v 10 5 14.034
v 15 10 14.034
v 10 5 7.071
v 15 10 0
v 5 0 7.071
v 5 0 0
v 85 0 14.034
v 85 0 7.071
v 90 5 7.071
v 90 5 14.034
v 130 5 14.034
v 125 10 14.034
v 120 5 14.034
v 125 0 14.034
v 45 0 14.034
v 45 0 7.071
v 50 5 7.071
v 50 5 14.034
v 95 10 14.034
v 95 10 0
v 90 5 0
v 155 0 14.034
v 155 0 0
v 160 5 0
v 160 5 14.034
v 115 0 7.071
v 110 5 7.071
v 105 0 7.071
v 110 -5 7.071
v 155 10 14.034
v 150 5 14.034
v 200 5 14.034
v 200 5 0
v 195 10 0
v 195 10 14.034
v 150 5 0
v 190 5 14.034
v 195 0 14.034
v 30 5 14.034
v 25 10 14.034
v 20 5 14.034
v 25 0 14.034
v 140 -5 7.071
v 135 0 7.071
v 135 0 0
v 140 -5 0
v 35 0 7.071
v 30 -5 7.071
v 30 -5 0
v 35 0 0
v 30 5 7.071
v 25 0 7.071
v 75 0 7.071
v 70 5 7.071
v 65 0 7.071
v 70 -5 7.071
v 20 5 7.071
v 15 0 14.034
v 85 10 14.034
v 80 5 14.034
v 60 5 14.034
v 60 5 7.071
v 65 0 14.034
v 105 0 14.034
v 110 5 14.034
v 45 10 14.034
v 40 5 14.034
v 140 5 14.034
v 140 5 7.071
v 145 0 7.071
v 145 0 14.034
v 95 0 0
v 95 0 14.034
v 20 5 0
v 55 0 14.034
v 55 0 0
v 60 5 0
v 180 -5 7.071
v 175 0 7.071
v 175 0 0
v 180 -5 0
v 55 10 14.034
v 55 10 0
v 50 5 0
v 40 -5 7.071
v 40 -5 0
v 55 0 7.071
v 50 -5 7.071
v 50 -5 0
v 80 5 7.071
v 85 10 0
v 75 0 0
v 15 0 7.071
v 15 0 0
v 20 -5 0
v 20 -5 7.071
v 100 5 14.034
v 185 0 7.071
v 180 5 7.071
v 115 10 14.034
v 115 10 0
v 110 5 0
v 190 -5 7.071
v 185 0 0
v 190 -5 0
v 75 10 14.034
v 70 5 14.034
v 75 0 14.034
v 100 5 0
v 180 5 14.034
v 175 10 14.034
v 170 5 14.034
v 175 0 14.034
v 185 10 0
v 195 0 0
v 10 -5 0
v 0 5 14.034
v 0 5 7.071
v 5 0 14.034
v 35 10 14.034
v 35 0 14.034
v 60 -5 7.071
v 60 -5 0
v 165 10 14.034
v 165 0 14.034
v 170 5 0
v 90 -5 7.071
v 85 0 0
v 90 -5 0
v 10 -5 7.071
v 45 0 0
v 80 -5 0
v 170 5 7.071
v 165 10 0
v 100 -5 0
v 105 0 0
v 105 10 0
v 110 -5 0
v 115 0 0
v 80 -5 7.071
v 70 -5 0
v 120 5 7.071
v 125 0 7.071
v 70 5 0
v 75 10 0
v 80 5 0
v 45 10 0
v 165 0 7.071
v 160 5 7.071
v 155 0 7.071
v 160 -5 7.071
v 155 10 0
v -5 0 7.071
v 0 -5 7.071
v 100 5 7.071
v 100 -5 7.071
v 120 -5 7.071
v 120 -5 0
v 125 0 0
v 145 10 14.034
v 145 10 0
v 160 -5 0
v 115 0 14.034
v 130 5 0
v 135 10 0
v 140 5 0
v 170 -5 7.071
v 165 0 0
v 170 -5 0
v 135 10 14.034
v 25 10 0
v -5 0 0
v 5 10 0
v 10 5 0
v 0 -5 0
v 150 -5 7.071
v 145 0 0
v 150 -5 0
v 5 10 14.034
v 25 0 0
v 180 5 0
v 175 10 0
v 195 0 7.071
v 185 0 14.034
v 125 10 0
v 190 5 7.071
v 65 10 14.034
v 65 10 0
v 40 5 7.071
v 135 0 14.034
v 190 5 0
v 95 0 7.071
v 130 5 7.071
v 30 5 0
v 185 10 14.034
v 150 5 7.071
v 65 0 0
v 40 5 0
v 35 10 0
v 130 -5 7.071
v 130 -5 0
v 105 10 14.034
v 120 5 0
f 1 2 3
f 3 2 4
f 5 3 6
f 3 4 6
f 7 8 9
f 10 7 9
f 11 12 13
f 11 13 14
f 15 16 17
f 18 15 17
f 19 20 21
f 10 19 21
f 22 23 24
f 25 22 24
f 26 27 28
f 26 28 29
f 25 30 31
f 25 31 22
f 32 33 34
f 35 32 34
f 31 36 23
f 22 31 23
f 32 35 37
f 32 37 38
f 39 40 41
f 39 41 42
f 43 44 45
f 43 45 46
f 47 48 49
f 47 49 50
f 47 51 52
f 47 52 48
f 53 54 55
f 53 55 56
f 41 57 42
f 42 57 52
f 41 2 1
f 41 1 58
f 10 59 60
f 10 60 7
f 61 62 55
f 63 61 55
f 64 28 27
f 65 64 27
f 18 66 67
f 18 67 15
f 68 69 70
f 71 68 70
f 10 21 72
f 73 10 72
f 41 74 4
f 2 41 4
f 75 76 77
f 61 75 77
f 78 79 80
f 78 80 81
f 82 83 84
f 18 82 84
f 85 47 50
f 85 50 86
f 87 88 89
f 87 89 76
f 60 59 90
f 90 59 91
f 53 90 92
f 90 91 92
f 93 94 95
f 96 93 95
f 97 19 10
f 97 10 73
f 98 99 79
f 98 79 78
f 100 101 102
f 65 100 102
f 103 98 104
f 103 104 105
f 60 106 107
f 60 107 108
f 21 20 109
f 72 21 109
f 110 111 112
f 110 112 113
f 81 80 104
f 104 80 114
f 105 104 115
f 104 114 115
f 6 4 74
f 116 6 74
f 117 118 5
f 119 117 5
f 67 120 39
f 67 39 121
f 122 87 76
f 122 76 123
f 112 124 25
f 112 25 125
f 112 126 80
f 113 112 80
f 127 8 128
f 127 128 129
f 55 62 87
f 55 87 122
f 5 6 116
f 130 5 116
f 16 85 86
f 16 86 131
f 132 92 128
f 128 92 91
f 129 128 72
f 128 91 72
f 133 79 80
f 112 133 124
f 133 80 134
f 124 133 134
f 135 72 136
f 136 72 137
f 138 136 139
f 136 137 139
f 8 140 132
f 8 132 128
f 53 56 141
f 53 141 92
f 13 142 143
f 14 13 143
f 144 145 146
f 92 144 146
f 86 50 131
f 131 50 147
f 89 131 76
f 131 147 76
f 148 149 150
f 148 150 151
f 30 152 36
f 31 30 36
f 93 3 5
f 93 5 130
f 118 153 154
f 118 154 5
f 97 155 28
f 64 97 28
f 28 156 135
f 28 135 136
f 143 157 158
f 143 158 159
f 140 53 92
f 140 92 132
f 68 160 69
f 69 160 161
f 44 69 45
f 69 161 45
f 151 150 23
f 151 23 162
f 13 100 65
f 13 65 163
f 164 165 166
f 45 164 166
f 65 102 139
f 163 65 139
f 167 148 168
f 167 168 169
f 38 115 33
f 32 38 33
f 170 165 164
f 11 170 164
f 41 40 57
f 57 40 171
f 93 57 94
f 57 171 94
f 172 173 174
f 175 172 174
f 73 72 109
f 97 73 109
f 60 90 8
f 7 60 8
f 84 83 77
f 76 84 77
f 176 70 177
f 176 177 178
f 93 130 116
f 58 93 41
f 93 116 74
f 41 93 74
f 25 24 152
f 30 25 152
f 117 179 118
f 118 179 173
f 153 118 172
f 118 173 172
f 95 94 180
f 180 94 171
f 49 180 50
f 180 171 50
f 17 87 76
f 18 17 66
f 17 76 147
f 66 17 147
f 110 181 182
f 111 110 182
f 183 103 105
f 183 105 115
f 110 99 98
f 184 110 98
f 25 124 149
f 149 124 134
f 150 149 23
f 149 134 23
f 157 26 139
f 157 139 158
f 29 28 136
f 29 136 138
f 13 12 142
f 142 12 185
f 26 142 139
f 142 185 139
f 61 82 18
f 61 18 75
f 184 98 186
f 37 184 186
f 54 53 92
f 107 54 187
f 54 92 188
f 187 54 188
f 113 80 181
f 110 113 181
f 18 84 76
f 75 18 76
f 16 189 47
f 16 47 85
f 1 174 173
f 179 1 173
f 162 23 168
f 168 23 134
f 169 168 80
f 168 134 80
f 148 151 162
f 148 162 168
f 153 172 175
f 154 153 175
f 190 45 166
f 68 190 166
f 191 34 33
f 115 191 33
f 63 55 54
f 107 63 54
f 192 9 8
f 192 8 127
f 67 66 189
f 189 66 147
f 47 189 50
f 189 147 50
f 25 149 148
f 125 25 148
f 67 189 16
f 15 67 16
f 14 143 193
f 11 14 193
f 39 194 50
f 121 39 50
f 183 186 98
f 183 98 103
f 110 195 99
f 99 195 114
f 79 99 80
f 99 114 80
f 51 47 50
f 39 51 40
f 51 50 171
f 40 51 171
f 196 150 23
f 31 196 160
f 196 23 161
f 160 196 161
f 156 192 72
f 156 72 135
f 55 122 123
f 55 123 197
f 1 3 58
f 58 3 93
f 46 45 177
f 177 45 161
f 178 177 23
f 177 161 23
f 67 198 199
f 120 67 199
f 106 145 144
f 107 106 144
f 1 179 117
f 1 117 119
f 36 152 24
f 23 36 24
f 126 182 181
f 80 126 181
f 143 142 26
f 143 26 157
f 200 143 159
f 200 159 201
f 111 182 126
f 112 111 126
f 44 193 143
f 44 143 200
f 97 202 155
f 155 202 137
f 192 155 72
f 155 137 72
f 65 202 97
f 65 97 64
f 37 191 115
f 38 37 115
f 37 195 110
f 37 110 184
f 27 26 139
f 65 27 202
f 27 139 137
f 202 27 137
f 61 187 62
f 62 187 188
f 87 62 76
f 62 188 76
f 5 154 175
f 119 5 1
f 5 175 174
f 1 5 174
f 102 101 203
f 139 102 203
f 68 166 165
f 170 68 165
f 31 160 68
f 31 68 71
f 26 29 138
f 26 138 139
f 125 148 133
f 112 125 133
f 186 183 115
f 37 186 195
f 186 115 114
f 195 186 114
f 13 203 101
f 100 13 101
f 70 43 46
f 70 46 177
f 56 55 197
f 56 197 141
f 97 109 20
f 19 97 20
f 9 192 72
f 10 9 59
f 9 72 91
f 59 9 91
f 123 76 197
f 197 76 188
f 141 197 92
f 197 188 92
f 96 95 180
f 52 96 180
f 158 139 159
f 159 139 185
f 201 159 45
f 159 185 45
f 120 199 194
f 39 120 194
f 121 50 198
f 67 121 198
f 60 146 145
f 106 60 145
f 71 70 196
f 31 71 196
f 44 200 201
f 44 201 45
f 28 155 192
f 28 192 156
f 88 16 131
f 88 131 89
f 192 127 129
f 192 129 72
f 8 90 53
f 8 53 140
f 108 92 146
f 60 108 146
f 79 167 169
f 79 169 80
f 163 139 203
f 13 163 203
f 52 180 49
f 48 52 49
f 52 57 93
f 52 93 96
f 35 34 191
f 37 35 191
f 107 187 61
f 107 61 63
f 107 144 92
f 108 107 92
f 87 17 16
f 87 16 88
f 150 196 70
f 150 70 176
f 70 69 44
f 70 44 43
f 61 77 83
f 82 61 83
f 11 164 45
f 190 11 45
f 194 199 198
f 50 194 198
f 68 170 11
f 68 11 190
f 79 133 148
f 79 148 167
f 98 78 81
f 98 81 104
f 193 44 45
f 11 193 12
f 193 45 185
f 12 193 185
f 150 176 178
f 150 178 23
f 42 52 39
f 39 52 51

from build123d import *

# Parameters (mm, degrees)
F1_DEPTH = 7.07107
F2_DEPTH = 14.034


with BuildPart() as f1:
    # F0 (on Top) → F1 (new body)
    with BuildSketch(Plane.XY):
        Polygon((5, 0), (0, 5), (-5, 0), (0, -5), align=None)
    extrude(amount=F1_DEPTH)

    # F0 (on Top) → F2, piece 4 (join)
    with BuildSketch(Plane.XY):
        Polygon((5, 10), (0, 5), (5, 0), (10, 5), align=None)
    extrude(amount=F2_DEPTH)


with BuildPart() as f1b:
    # F0 (on Top) → F1, piece 2 (new body)
    with BuildSketch(Plane.XY):
        Polygon((10, 5), (5, 0), (10, -5), (15, 0), align=None)
    extrude(amount=F1_DEPTH)

    # F0 (on Top) → F2 (join)
    with BuildSketch(Plane.XY):
        Polygon((15, 10), (10, 5), (15, 0), (20, 5), align=None)
    extrude(amount=F2_DEPTH)


with BuildPart() as f1c:
    # F0 (on Top) → F1, piece 3 (new body)
    with BuildSketch(Plane.XY):
        Polygon((20, 5), (15, 0), (20, -5), (25, 0), align=None)
    extrude(amount=F1_DEPTH)



with BuildPart() as f1d:
    # F0 (on Top) → F1, piece 4 (new body)
    with BuildSketch(Plane.XY):
        Polygon((30, 5), (25, 0), (30, -5), (35, 0), align=None)
    extrude(amount=F1_DEPTH)


with BuildPart() as f1e:
    # F0 (on Top) → F1, piece 5 (new body)
    with BuildSketch(Plane.XY):
        Polygon((40, 5), (35, 0), (40, -5), (45, 0), align=None)
    extrude(amount=F1_DEPTH)



with BuildPart() as f1f:
    # F0 (on Top) → F1, piece 6 (new body)
    with BuildSketch(Plane.XY):
        Polygon((50, 5), (45, 0), (50, -5), (55, 0), align=None)
    extrude(amount=F1_DEPTH)


with BuildPart() as f1g:
    # F0 (on Top) → F1, piece 7 (new body)
    with BuildSketch(Plane.XY):
        Polygon((60, 5), (55, 0), (60, -5), (65, 0), align=None)
    extrude(amount=F1_DEPTH)



with BuildPart() as f1h:
    # F0 (on Top) → F1, piece 8 (new body)
    with BuildSketch(Plane.XY):
        Polygon((70, 5), (65, 0), (70, -5), (75, 0), align=None)
    extrude(amount=F1_DEPTH)


with BuildPart() as f1i:
    # F0 (on Top) → F1, piece 9 (new body)
    with BuildSketch(Plane.XY):
        Polygon((80, 5), (75, 0), (80, -5), (85, 0), align=None)
    extrude(amount=F1_DEPTH)



with BuildPart() as f1j:
    # F0 (on Top) → F1, piece 10 (new body)
    with BuildSketch(Plane.XY):
        Polygon((90, 5), (85, 0), (90, -5), (95, 0), align=None)
    extrude(amount=F1_DEPTH)


with BuildPart() as f1k:
    # F0 (on Top) → F1, piece 11 (new body)
    with BuildSketch(Plane.XY):
        Polygon((100, 5), (95, 0), (100, -5), (105, 0), align=None)
    extrude(amount=F1_DEPTH)



with BuildPart() as f1l:
    # F0 (on Top) → F1, piece 12 (new body)
    with BuildSketch(Plane.XY):
        Polygon((110, 5), (105, 0), (110, -5), (115, 0), align=None)
    extrude(amount=F1_DEPTH)


with BuildPart() as f1m:
    # F0 (on Top) → F1, piece 13 (new body)
    with BuildSketch(Plane.XY):
        Polygon((120, 5), (115, 0), (120, -5), (125, 0), align=None)
    extrude(amount=F1_DEPTH)



with BuildPart() as f1n:
    # F0 (on Top) → F1, piece 14 (new body)
    with BuildSketch(Plane.XY):
        Polygon((130, 5), (125, 0), (130, -5), (135, 0), align=None)
    extrude(amount=F1_DEPTH)


with BuildPart() as f1o:
    # F0 (on Top) → F1, piece 15 (new body)
    with BuildSketch(Plane.XY):
        Polygon((140, 5), (135, 0), (140, -5), (145, 0), align=None)
    extrude(amount=F1_DEPTH)



with BuildPart() as f1p:
    # F0 (on Top) → F1, piece 16 (new body)
    with BuildSketch(Plane.XY):
        Polygon((150, 5), (145, 0), (150, -5), (155, 0), align=None)
    extrude(amount=F1_DEPTH)


with BuildPart() as f1q:
    # F0 (on Top) → F1, piece 17 (new body)
    with BuildSketch(Plane.XY):
        Polygon((160, 5), (155, 0), (160, -5), (165, 0), align=None)
    extrude(amount=F1_DEPTH)



with BuildPart() as f1r:
    # F0 (on Top) → F1, piece 18 (new body)
    with BuildSketch(Plane.XY):
        Polygon((170, 5), (165, 0), (170, -5), (175, 0), align=None)
    extrude(amount=F1_DEPTH)


with BuildPart() as f1s:
    # F0 (on Top) → F1, piece 19 (new body)
    with BuildSketch(Plane.XY):
        Polygon((180, 5), (175, 0), (180, -5), (185, 0), align=None)
    extrude(amount=F1_DEPTH)



with BuildPart() as f1t:
    # F0 (on Top) → F1, piece 20 (new body)
    with BuildSketch(Plane.XY):
        Polygon((190, 5), (185, 0), (190, -5), (195, 0), align=None)
    extrude(amount=F1_DEPTH)


with BuildPart() as f1c_1:
    add(f1c.part)

    add(f1d.part)  # F2#2 merges F1d
    # F0 (on Top) → F2, piece 2 (join)
    with BuildSketch(Plane.XY):
        Polygon((25, 10), (20, 5), (25, 0), (30, 5), align=None)
    extrude(amount=F2_DEPTH)


with BuildPart() as f2:
    # F0 (on Top) → F2, piece 3 (new body)
    with BuildSketch(Plane.XY):
        Polygon((35, 10), (30, 5), (35, 0), (40, 5), align=None)
    extrude(amount=F2_DEPTH)


with BuildPart() as f1e_1:
    add(f1e.part)

    add(f1f.part)  # F2#5 merges F1f
    # F0 (on Top) → F2, piece 5 (join)
    with BuildSketch(Plane.XY):
        Polygon((45, 10), (40, 5), (45, 0), (50, 5), align=None)
    extrude(amount=F2_DEPTH)


with BuildPart() as f2b:
    # F0 (on Top) → F2, piece 6 (new body)
    with BuildSketch(Plane.XY):
        Polygon((95, 10), (90, 5), (95, 0), (100, 5), align=None)
    extrude(amount=F2_DEPTH)


with BuildPart() as f1k_1:
    add(f1k.part)

    add(f1l.part)  # F2#7 merges F1l
    # F0 (on Top) → F2, piece 7 (join)
    with BuildSketch(Plane.XY):
        Polygon((105, 10), (100, 5), (105, 0), (110, 5), align=None)
    extrude(amount=F2_DEPTH)


with BuildPart() as f2c:
    # F0 (on Top) → F2, piece 8 (new body)
    with BuildSketch(Plane.XY):
        Polygon((115, 10), (110, 5), (115, 0), (120, 5), align=None)
    extrude(amount=F2_DEPTH)


with BuildPart() as f1m_1:
    add(f1m.part)

    add(f1n.part)  # F2#9 merges F1n
    # F0 (on Top) → F2, piece 9 (join)
    with BuildSketch(Plane.XY):
        Polygon((125, 10), (120, 5), (125, 0), (130, 5), align=None)
    extrude(amount=F2_DEPTH)


with BuildPart() as f2d:
    # F0 (on Top) → F2, piece 10 (new body)
    with BuildSketch(Plane.XY):
        Polygon((135, 10), (130, 5), (135, 0), (140, 5), align=None)
    extrude(amount=F2_DEPTH)


with BuildPart() as f1o_1:
    add(f1o.part)

    add(f1p.part)  # F2#11 merges F1p
    # F0 (on Top) → F2, piece 11 (join)
    with BuildSketch(Plane.XY):
        Polygon((145, 10), (140, 5), (145, 0), (150, 5), align=None)
    extrude(amount=F2_DEPTH)


with BuildPart() as f2e:
    # F0 (on Top) → F2, piece 12 (new body)
    with BuildSketch(Plane.XY):
        Polygon((155, 10), (150, 5), (155, 0), (160, 5), align=None)
    extrude(amount=F2_DEPTH)


with BuildPart() as f1q_1:
    add(f1q.part)

    add(f1r.part)  # F2#13 merges F1r
    # F0 (on Top) → F2, piece 13 (join)
    with BuildSketch(Plane.XY):
        Polygon((165, 10), (160, 5), (165, 0), (170, 5), align=None)
    extrude(amount=F2_DEPTH)


with BuildPart() as f2f:
    # F0 (on Top) → F2, piece 14 (new body)
    with BuildSketch(Plane.XY):
        Polygon((175, 10), (170, 5), (175, 0), (180, 5), align=None)
    extrude(amount=F2_DEPTH)


with BuildPart() as f1s_1:
    add(f1s.part)

    add(f1t.part)  # F2#15 merges F1t
    # F0 (on Top) → F2, piece 15 (join)
    with BuildSketch(Plane.XY):
        Polygon((185, 10), (180, 5), (185, 0), (190, 5), align=None)
    extrude(amount=F2_DEPTH)


with BuildPart() as f2g:
    # F0 (on Top) → F2, piece 16 (new body)
    with BuildSketch(Plane.XY):
        Polygon((195, 10), (190, 5), (195, 0), (200, 5), align=None)
    extrude(amount=F2_DEPTH)


with BuildPart() as f1i_1:
    add(f1i.part)

    add(f1j.part)  # F2#17 merges F1j
    # F0 (on Top) → F2, piece 17 (join)
    with BuildSketch(Plane.XY):
        Polygon((85, 10), (80, 5), (85, 0), (90, 5), align=None)
    extrude(amount=F2_DEPTH)


with BuildPart() as f2h:
    # F0 (on Top) → F2, piece 18 (new body)
    with BuildSketch(Plane.XY):
        Polygon((75, 10), (70, 5), (75, 0), (80, 5), align=None)
    extrude(amount=F2_DEPTH)


with BuildPart() as f2i:
    # F0 (on Top) → F2, piece 19 (new body)
    with BuildSketch(Plane.XY):
        Polygon((55, 10), (50, 5), (55, 0), (60, 5), align=None)
    extrude(amount=F2_DEPTH)


with BuildPart() as f1g_1:
    add(f1g.part)

    add(f1h.part)  # F2#20 merges F1h
    # F0 (on Top) → F2, piece 20 (join)
    with BuildSketch(Plane.XY):
        Polygon((65, 10), (60, 5), (65, 0), (70, 5), align=None)
    extrude(amount=F2_DEPTH)


solid = Compound([f1.part, f1b.part, f1c_1.part, f2.part, f1e_1.part, f2b.part, f1k_1.part, f2c.part, f1m_1.part, f2d.part, f1o_1.part, f2e.part, f1q_1.part, f2f.part, f1s_1.part, f2g.part, f1i_1.part, f2h.part, f2i.part, f1g_1.part])
